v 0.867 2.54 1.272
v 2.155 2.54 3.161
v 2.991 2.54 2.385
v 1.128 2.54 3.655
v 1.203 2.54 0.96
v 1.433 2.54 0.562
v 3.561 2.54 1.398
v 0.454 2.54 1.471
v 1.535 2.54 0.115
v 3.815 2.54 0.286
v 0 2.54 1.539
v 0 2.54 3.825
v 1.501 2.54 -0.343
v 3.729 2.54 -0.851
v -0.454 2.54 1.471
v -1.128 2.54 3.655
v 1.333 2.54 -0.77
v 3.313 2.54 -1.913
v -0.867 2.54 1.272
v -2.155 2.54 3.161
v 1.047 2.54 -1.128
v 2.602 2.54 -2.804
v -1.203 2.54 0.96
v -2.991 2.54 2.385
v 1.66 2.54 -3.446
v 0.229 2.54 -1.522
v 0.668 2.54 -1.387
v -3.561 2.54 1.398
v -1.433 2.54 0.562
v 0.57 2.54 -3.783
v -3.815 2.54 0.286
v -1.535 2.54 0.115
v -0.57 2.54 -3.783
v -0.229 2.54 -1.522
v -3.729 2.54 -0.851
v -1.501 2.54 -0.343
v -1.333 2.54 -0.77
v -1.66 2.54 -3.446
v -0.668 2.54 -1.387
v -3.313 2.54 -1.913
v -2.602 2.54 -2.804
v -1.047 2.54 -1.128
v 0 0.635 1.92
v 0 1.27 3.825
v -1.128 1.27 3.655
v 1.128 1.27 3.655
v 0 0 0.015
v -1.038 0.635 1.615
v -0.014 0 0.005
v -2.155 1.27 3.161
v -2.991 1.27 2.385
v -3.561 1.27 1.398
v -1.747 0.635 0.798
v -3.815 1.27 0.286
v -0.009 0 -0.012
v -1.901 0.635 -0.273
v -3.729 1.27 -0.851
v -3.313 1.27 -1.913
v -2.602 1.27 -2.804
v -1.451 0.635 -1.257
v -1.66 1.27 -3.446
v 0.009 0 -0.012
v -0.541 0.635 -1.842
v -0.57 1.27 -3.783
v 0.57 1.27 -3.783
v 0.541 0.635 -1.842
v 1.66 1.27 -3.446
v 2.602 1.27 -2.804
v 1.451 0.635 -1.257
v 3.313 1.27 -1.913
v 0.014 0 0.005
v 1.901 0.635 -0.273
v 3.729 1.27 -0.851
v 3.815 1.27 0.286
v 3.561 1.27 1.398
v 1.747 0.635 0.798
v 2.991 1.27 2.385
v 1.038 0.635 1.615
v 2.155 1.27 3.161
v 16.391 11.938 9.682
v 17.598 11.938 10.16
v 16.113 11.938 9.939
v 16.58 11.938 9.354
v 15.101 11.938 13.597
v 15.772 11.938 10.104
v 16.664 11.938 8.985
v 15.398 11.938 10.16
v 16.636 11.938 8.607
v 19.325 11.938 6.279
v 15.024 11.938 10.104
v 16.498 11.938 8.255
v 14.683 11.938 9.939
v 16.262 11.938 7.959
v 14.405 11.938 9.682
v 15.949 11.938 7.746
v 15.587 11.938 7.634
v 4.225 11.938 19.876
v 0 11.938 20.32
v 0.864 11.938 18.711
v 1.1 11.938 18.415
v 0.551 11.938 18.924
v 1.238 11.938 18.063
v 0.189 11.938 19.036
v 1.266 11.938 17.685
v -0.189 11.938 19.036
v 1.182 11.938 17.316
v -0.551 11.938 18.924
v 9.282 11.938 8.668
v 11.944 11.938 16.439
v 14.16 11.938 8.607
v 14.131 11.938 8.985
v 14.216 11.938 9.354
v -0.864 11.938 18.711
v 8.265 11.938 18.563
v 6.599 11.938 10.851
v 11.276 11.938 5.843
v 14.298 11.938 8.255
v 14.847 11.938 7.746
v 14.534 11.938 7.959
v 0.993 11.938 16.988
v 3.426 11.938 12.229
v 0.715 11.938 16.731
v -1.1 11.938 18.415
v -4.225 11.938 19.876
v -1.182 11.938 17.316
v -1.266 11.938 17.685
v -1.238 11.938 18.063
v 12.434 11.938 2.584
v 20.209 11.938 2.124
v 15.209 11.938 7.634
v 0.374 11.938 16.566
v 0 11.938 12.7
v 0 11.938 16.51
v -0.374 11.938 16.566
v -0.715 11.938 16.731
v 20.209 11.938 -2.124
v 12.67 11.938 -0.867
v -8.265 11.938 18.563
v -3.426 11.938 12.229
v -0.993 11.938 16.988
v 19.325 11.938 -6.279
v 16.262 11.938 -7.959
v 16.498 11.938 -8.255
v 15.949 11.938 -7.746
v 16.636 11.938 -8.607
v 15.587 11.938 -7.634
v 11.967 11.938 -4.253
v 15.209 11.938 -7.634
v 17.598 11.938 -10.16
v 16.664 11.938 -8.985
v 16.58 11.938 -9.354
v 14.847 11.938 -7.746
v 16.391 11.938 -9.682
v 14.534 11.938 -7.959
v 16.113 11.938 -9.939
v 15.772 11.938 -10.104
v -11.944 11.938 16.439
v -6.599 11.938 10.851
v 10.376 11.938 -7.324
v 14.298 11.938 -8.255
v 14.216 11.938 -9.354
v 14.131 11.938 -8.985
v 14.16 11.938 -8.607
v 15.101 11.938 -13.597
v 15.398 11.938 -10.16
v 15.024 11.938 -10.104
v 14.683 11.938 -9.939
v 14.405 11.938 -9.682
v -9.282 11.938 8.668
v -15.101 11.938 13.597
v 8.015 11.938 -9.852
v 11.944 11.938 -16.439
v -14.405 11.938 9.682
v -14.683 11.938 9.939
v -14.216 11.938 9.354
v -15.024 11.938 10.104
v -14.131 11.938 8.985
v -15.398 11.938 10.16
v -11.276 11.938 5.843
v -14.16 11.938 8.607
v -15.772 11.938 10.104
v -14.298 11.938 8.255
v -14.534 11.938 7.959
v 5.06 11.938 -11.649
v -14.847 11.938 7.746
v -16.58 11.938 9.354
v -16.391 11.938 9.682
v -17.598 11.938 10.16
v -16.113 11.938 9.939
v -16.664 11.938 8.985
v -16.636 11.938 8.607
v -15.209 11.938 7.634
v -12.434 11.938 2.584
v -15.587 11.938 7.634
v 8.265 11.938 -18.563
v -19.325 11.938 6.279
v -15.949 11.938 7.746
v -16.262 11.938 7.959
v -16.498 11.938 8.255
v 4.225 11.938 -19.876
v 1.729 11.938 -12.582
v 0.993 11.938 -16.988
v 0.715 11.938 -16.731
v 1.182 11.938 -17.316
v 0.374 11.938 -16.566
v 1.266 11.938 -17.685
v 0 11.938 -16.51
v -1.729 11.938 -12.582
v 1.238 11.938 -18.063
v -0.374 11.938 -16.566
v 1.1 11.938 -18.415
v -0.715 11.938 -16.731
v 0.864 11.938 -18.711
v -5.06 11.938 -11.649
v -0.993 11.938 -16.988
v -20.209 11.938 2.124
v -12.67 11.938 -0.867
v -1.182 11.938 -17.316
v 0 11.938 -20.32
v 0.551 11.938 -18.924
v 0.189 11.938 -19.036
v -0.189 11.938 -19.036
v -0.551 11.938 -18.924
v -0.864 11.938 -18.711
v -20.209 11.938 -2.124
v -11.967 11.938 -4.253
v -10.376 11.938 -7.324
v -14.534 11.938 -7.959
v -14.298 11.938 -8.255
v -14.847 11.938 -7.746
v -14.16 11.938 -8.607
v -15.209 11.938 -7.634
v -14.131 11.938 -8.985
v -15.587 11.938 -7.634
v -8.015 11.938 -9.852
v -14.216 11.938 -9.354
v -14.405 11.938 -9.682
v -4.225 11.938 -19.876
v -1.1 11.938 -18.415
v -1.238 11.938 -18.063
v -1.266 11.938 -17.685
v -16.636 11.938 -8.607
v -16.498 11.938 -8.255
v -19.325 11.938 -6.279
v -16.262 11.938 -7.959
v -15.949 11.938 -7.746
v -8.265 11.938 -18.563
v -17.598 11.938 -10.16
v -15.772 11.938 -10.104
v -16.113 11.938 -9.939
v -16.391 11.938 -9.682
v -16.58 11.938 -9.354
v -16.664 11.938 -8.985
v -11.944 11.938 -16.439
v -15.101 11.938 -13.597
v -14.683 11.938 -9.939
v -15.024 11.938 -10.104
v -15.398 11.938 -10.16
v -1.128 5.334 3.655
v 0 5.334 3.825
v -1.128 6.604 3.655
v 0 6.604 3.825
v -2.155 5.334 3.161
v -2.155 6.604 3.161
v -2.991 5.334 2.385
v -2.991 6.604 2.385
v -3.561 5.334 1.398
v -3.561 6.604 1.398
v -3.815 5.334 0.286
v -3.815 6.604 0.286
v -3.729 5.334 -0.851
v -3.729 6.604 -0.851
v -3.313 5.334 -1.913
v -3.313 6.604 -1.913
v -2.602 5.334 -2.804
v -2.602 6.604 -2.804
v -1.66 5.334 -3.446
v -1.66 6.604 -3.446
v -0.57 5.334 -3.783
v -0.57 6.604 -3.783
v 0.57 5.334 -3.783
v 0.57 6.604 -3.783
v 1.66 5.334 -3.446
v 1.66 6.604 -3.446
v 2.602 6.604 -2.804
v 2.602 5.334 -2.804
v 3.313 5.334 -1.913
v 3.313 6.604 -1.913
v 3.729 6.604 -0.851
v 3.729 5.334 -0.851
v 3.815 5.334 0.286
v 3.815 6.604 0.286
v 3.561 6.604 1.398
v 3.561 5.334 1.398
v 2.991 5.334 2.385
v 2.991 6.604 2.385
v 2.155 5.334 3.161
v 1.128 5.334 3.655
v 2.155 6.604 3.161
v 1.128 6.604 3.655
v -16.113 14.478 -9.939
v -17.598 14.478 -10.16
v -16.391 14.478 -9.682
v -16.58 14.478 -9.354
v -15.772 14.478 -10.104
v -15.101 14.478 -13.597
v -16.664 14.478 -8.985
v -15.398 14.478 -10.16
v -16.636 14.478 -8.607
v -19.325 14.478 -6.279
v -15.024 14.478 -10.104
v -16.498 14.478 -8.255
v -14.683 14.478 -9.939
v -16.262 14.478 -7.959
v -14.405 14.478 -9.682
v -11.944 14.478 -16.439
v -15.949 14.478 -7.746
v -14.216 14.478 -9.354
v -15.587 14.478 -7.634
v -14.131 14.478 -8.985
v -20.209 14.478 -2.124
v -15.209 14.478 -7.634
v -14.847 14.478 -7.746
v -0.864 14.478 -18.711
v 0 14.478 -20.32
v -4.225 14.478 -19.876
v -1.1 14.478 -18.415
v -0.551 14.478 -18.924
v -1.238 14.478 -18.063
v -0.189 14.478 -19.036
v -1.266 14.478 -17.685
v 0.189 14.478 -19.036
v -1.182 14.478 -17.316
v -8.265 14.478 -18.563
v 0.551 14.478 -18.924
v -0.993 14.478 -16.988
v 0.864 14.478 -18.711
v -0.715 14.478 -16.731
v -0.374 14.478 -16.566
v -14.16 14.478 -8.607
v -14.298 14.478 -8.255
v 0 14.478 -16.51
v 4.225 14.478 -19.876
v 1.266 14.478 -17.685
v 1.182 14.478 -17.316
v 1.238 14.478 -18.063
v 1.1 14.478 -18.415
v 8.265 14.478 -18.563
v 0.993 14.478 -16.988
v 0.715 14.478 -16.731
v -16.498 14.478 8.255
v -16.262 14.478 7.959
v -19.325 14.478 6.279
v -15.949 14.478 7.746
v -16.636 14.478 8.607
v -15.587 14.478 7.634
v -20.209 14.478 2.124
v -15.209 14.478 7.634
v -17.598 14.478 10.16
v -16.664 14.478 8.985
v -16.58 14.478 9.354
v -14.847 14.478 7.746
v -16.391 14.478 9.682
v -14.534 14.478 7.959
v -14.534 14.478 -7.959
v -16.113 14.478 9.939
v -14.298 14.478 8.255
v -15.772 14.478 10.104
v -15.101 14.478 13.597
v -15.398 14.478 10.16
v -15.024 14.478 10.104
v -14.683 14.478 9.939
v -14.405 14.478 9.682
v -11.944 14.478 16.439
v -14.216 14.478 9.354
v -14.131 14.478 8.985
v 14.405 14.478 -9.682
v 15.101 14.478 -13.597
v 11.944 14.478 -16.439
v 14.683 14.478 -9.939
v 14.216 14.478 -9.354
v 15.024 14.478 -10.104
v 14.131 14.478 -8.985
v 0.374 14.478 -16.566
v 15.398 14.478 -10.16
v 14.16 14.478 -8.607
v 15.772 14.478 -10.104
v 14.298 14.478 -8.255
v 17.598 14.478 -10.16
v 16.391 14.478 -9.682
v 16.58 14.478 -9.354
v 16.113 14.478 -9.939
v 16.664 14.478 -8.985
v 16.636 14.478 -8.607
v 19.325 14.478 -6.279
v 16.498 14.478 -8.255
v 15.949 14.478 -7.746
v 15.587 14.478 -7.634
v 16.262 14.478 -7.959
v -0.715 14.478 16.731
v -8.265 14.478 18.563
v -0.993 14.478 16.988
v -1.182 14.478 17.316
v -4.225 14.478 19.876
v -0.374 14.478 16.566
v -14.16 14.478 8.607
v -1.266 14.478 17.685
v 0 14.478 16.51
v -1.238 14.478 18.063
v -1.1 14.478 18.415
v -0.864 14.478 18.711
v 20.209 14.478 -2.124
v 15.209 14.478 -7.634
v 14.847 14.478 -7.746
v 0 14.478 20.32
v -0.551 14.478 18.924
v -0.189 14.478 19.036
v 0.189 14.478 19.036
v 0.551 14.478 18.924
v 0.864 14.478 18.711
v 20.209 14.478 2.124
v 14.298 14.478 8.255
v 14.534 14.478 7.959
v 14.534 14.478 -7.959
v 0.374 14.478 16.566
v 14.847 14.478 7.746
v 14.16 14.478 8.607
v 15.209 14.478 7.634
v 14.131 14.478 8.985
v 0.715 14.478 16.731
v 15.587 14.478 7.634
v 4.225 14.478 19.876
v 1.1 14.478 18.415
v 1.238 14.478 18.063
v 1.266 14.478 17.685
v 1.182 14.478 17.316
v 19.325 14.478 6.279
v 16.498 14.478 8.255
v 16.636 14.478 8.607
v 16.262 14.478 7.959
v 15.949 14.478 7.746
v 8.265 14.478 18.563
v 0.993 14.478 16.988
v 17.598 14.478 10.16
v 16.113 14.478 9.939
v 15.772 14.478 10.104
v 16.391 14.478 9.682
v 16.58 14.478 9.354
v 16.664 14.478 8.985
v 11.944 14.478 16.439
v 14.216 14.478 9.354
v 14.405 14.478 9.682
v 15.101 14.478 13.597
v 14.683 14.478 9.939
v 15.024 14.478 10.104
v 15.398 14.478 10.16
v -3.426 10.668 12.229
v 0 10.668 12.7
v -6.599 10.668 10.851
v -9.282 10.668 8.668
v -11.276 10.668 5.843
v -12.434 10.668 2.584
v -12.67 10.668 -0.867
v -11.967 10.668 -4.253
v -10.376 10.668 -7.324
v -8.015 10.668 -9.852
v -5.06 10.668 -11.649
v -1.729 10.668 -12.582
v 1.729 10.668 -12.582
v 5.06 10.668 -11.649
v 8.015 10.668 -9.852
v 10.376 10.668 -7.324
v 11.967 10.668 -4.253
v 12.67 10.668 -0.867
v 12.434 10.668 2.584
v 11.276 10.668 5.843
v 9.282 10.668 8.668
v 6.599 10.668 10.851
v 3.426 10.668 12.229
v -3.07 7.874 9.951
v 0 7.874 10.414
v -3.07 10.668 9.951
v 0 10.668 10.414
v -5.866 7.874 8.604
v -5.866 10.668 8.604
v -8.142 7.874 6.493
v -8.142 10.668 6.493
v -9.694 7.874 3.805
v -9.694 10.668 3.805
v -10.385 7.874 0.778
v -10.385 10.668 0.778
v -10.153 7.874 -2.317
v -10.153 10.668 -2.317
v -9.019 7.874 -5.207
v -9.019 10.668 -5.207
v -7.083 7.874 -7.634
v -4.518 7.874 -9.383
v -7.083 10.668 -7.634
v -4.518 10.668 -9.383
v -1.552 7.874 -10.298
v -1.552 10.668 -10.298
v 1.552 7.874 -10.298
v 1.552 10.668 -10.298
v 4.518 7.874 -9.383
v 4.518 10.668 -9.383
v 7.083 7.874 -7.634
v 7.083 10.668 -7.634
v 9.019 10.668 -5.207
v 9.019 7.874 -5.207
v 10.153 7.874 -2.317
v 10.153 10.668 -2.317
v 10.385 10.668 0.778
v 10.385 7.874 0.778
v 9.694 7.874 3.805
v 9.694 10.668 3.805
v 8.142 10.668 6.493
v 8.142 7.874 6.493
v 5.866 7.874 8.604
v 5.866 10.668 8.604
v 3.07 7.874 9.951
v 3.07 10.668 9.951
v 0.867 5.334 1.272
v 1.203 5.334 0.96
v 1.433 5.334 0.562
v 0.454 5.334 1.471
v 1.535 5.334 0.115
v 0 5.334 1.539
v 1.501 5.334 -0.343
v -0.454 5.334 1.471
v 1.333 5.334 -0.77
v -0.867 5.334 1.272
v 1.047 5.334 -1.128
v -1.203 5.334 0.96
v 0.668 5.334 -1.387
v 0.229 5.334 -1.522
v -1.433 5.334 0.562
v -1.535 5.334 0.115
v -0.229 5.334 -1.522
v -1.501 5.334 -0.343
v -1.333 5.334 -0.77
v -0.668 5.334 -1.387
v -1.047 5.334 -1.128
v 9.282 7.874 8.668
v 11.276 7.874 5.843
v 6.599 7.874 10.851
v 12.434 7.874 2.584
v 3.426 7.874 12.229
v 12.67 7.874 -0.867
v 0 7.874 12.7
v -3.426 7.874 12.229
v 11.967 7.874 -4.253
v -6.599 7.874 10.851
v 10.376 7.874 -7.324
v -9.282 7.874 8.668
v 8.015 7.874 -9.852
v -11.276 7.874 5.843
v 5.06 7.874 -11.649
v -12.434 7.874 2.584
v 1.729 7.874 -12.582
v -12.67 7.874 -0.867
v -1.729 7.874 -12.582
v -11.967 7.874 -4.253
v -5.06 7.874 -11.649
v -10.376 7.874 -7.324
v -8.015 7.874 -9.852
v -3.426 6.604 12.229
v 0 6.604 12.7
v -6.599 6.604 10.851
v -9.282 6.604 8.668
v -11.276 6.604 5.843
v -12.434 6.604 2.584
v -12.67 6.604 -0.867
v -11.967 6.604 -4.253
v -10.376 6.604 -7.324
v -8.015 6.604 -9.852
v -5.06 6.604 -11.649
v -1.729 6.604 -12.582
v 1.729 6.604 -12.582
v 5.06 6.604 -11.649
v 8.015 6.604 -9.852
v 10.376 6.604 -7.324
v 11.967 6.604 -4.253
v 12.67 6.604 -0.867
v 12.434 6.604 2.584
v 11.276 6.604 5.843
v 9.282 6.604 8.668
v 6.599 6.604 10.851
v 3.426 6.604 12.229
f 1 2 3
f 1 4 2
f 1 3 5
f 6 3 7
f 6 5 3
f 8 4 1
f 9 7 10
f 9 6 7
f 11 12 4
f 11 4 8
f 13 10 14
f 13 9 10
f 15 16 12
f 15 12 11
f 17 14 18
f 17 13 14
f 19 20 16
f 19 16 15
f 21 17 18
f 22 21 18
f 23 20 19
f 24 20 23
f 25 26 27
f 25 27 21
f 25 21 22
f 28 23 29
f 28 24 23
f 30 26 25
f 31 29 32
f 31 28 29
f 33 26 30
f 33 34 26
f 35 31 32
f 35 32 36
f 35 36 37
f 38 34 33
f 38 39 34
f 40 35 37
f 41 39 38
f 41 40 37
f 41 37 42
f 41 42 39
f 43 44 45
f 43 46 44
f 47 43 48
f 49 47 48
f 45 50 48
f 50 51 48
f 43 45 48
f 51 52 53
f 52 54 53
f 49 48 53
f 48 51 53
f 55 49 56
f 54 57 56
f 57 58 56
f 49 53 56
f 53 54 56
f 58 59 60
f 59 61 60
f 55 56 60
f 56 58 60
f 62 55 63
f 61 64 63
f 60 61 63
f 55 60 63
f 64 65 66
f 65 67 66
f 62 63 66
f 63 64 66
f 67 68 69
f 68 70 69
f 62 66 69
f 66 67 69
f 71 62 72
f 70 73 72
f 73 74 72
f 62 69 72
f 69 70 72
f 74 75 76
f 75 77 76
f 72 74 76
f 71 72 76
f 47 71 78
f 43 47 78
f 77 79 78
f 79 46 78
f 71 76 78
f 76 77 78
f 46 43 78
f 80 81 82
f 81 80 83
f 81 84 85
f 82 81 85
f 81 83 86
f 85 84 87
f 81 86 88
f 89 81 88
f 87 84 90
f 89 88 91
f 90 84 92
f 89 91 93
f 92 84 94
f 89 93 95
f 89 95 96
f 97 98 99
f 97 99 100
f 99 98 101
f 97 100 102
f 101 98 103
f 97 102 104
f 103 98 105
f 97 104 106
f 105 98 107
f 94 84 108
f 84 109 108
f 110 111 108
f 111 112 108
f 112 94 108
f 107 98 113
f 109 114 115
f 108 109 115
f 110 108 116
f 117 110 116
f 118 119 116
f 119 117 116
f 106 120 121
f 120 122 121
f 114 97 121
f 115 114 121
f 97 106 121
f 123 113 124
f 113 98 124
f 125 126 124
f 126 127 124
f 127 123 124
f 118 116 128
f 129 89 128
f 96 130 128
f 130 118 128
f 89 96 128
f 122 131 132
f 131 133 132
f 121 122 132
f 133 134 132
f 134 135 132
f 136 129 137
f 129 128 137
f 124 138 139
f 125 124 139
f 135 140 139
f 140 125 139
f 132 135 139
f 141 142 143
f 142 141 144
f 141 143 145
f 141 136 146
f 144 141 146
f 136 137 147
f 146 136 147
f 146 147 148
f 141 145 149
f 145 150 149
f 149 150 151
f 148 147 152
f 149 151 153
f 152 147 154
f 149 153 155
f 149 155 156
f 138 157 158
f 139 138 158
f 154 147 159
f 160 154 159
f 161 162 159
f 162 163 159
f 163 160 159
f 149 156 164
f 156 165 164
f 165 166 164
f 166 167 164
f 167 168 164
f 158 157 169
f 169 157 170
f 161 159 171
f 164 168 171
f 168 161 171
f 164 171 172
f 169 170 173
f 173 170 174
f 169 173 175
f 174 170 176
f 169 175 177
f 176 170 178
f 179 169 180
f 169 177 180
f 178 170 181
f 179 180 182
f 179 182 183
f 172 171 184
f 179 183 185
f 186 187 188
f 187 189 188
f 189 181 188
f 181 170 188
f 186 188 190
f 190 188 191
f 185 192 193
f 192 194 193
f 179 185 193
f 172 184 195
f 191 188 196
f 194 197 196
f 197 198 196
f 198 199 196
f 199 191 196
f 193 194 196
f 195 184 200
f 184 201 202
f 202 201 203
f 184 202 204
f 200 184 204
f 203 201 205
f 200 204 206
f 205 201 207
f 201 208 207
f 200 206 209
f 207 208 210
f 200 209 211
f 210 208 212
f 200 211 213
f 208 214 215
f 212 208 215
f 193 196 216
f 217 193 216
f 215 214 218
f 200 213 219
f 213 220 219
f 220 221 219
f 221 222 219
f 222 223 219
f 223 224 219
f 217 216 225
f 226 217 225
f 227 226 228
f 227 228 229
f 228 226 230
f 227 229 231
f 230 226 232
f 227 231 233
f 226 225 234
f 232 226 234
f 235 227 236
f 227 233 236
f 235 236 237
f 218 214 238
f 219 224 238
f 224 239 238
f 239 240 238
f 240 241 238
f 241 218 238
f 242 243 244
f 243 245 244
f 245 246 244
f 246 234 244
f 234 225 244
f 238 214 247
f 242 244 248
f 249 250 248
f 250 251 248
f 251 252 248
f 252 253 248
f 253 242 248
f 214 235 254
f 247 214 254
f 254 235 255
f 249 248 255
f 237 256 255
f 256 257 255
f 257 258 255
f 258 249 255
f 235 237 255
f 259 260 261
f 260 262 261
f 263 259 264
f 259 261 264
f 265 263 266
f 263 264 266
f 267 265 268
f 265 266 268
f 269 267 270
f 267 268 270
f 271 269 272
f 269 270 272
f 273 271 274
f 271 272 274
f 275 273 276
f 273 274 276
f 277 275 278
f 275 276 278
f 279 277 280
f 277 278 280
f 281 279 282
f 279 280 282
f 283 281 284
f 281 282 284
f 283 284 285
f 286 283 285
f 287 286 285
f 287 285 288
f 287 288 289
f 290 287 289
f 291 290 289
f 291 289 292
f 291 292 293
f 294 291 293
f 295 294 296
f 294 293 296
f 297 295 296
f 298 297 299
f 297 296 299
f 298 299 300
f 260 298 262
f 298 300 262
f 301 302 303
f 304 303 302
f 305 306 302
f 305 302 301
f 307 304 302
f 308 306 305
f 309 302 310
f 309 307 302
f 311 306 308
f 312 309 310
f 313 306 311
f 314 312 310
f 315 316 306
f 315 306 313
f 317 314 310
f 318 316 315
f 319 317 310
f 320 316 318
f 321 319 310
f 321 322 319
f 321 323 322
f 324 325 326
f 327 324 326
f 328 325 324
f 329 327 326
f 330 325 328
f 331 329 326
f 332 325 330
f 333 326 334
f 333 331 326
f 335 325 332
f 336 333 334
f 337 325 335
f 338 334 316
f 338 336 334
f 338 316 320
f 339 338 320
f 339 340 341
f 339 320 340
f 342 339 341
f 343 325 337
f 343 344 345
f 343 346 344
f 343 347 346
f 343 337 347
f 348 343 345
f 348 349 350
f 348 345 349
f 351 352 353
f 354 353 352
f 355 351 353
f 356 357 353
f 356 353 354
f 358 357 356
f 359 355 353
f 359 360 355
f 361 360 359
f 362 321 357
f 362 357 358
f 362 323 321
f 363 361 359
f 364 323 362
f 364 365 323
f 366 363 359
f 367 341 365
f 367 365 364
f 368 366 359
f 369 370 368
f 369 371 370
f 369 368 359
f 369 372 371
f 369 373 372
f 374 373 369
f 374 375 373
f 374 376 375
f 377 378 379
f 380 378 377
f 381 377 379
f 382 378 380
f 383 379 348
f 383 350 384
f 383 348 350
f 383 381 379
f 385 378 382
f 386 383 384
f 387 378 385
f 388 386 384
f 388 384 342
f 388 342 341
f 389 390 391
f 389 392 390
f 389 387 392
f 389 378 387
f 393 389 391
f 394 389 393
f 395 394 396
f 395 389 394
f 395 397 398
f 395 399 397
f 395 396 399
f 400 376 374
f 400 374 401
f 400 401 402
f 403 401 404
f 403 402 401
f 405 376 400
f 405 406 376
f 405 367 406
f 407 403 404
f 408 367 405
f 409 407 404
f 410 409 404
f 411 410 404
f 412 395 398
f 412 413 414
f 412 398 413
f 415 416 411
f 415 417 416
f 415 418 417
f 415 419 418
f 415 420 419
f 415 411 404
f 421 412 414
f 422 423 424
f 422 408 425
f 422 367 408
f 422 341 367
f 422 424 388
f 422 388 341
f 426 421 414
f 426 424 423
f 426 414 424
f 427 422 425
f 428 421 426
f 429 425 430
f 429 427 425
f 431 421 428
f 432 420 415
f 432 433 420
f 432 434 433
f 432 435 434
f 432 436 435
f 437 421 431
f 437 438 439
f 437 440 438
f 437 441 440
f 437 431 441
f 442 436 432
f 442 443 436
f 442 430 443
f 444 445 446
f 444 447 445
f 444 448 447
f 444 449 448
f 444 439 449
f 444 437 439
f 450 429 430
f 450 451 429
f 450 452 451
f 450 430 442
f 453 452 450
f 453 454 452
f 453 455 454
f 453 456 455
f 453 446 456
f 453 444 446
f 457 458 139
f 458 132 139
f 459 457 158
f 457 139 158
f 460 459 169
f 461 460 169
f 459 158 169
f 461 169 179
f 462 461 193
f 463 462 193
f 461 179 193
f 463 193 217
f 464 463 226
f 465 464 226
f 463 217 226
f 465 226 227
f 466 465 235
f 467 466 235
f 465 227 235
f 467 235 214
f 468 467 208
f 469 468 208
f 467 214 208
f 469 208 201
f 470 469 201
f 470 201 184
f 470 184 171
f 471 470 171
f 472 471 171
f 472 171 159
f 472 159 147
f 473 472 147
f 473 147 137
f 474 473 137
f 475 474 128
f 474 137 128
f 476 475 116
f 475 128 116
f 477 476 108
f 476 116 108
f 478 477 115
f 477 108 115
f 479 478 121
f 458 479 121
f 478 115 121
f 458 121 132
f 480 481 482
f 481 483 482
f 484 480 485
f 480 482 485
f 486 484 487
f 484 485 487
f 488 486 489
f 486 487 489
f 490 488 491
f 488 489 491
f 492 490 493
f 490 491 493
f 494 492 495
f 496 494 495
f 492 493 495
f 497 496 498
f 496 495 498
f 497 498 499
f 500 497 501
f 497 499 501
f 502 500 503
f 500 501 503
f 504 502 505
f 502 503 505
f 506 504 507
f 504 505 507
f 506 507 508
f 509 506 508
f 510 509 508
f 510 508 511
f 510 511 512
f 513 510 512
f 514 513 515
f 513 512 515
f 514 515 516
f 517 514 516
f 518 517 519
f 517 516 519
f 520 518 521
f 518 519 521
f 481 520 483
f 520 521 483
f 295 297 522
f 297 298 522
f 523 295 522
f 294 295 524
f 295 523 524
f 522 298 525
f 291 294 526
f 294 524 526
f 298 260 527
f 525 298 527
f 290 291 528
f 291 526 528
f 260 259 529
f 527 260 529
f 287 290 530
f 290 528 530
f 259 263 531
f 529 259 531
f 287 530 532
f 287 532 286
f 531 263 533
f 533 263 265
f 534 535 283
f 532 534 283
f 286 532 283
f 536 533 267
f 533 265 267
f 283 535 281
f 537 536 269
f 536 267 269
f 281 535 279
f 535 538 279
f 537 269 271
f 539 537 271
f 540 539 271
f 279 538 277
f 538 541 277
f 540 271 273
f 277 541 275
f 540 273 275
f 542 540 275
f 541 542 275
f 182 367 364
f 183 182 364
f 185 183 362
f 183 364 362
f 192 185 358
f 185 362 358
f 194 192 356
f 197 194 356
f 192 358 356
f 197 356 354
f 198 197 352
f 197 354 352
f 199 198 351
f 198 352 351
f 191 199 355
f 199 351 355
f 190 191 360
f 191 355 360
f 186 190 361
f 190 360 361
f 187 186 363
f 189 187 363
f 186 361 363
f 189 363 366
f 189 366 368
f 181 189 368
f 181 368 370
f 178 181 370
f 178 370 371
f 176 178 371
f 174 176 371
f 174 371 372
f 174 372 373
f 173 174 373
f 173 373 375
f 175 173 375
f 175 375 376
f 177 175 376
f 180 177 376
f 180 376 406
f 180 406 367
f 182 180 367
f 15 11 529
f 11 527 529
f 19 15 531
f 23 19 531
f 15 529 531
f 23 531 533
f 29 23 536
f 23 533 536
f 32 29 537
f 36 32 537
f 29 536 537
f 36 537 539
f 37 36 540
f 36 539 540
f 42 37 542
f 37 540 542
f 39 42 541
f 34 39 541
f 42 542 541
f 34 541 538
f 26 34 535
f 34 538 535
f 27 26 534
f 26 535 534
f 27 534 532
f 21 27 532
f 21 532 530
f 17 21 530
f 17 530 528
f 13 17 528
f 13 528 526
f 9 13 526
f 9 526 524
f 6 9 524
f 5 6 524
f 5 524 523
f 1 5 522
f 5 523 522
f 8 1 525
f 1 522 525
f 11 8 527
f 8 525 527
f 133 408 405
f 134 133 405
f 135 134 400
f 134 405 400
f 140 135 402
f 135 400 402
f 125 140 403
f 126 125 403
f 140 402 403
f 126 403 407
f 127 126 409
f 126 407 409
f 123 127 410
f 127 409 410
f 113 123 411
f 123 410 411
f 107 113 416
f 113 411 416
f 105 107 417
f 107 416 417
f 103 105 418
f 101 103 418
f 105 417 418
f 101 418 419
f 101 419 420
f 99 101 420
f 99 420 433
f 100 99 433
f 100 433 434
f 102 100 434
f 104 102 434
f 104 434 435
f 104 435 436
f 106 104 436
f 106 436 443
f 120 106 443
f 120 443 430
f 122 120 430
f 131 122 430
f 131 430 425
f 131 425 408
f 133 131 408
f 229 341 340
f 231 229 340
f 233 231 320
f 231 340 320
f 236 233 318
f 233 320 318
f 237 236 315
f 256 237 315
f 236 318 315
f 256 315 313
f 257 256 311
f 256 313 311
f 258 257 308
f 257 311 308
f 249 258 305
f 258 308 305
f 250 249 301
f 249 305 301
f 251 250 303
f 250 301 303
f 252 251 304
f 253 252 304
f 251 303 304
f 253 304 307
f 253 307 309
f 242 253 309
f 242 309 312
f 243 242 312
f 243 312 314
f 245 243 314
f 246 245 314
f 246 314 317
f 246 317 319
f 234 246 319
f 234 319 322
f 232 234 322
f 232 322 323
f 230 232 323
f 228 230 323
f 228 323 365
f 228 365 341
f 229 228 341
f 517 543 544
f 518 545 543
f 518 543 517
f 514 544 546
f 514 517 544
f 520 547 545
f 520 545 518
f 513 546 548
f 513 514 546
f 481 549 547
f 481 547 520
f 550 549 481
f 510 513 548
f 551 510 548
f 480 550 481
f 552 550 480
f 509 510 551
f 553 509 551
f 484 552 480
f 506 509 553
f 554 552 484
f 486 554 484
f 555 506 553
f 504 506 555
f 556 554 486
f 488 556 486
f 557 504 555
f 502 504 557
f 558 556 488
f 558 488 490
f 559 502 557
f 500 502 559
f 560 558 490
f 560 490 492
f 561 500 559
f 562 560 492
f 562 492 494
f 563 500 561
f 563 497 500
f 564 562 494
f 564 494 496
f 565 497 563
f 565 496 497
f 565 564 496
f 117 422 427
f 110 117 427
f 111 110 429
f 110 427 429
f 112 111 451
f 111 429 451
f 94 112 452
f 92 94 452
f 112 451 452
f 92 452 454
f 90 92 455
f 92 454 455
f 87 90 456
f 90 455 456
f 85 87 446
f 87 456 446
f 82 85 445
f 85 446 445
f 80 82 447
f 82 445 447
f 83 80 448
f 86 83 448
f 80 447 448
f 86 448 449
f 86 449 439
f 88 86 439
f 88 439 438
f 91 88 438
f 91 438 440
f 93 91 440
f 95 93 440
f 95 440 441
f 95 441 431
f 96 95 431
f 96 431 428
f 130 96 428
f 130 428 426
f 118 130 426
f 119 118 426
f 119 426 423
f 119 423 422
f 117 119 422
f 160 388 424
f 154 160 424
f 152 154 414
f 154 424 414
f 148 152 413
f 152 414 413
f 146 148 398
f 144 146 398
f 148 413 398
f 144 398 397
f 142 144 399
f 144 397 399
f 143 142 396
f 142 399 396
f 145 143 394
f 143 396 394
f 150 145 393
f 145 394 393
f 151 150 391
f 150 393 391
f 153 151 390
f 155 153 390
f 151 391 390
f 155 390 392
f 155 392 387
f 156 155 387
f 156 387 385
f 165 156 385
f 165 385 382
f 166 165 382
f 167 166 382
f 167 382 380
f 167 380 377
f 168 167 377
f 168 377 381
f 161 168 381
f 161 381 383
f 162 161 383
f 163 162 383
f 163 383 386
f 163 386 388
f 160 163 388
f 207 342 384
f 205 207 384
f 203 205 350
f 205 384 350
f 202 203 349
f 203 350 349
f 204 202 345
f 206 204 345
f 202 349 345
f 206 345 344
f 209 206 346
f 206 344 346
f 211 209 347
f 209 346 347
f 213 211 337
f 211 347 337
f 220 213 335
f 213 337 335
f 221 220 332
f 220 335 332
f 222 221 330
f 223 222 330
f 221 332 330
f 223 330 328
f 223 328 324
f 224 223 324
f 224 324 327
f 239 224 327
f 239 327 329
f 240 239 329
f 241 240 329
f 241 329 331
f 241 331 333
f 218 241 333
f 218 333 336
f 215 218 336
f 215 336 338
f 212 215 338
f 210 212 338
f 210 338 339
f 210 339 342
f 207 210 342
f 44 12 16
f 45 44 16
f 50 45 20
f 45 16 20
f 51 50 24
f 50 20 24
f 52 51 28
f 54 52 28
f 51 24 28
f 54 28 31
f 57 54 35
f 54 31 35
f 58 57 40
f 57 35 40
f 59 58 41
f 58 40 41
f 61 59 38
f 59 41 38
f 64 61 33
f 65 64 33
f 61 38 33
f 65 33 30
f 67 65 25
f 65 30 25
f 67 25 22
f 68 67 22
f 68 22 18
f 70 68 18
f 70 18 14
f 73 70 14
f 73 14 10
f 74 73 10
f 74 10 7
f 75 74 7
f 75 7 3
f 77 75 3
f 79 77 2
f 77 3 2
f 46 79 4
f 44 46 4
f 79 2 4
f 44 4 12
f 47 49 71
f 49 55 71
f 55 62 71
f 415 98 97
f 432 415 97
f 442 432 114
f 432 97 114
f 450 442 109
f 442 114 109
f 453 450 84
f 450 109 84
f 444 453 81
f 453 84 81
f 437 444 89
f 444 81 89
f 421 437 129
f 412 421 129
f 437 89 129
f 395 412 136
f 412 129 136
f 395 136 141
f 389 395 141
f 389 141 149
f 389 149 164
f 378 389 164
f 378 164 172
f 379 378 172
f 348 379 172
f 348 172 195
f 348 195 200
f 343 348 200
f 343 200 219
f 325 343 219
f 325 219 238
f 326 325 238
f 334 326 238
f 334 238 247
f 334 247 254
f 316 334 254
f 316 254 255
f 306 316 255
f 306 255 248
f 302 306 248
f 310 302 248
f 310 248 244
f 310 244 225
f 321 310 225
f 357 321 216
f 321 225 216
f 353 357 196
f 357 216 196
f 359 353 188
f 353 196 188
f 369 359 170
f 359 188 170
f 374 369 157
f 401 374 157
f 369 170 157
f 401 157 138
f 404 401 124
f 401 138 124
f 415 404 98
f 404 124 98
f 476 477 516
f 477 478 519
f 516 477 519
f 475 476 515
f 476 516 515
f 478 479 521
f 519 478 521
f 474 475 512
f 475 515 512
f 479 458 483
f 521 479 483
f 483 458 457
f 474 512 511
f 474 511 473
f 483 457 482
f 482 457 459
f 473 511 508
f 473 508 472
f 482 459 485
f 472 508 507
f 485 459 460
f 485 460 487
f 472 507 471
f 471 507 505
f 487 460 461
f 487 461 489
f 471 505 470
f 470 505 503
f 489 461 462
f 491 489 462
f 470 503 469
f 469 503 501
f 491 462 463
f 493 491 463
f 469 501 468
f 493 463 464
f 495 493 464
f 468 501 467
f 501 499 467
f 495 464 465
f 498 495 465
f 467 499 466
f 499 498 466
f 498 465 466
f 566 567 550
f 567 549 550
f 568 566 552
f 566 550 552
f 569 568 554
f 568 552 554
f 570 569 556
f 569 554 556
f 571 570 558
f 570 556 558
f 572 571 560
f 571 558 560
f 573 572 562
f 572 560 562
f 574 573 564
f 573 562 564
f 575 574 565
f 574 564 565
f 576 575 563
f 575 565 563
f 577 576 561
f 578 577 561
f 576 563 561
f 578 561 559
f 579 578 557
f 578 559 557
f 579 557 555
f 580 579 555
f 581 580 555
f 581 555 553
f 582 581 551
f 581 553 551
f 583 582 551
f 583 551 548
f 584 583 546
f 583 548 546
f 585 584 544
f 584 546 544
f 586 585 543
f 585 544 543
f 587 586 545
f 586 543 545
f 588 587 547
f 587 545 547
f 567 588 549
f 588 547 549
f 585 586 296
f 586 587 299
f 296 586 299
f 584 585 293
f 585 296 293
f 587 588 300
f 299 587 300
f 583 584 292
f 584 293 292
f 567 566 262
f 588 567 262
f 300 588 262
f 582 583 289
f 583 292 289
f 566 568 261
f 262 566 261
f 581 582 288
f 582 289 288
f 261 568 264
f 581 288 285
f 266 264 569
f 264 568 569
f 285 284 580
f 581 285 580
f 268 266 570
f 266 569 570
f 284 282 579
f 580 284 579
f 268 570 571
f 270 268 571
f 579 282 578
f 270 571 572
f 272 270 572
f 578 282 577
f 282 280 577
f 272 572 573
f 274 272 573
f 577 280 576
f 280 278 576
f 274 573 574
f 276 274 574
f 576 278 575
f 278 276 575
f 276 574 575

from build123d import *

# Parameters (mm, degrees)
SKETCH1_R                   = 20.32
CYLINDER_DEPTH              = 14.478
SKETCH2_W                   = 7.62
SKETCH2_H                   = 11.938
SKETCH3_W                   = 2.286
SKETCH3_H                   = 2.794
SKETCH4_W                   = 8.87476
SKETCH4_H                   = 6.604
SKETCH5_W                   = 2.286
SKETCH5_H                   = 2.794
BOTTOM_CHAMFER_SIZE         = 3.81
BOTTOM_CHAMFER_SIZE2        = 1.27
MOUNTING_HOLE_REACH         = 34.178
SKETCH6_R                   = 1.27
MOUNTING_HOLE_PATTERN_COUNT = 6


with BuildPart() as part:
    # Sketch1 → Cylinder (new body)
    with BuildSketch(Plane(origin=(0, 0, 0), x_dir=(1, 0, 0), z_dir=(0, 1, 0))):
        with Locations(Location((0, 0, 0), (0, 0, 270))):
            Circle(SKETCH1_R)
    extrude(amount=CYLINDER_DEPTH)

    # Sketch2 → Mid O Ring Wings (revolve, cut)
    with BuildSketch(Plane.XY, mode=Mode.PRIVATE) as mid_o_ring_wings_sk:
        with Locations((16.51, 5.969)):
            Rectangle(SKETCH2_W, SKETCH2_H)
    revolve(mid_o_ring_wings_sk.sketch.rotate(Axis((0, 21.496286204, 0), (0, -1, 0)), 90), axis=Axis((0, 21.496286204, 0), (0, -1, 0)), mode=Mode.SUBTRACT)

    # Sketch3 → Mid O Ring Cut (revolve, cut)
    with BuildSketch(Plane.XY, mode=Mode.PRIVATE) as mid_o_ring_cut_sk:
        with Locations((11.557, 9.271)):
            Rectangle(SKETCH3_W, SKETCH3_H)
    revolve(mid_o_ring_cut_sk.sketch.rotate(Axis((0, 21.496286204, 0), (0, -1, 0)), 90), axis=Axis((0, 21.496286204, 0), (0, -1, 0)), mode=Mode.SUBTRACT)

    # Sketch4 → Bottom O Ring Wings (revolve, cut)
    with BuildSketch(Plane.XY, mode=Mode.PRIVATE) as bottom_o_ring_wings_sk:
        with Locations((8.26262, 3.302)):
            Rectangle(SKETCH4_W, SKETCH4_H)
    revolve(bottom_o_ring_wings_sk.sketch.rotate(Axis((0, 21.496286204, 0), (0, -1, 0)), 90), axis=Axis((0, 21.496286204, 0), (0, -1, 0)), mode=Mode.SUBTRACT)

    # Sketch5 → Bottom O Ring Cut (revolve, cut)
    with BuildSketch(Plane.XY, mode=Mode.PRIVATE) as bottom_o_ring_cut_sk:
        with Locations((2.68224, 3.937)):
            Rectangle(SKETCH5_W, SKETCH5_H)
    revolve(bottom_o_ring_cut_sk.sketch.rotate(Axis((0, 21.496286204, 0), (0, -1, 0)), 90), axis=Axis((0, 21.496286204, 0), (0, -1, 0)), mode=Mode.SUBTRACT)

    # Bottom Chamfer
    bottom_chamfer_edges = [part.edges().sort_by_distance(p)[0] for p in [
        (0, 0, -3.82524),
    ]]
    bottom_chamfer_side = [part.faces().sort_by_distance(p)[0] for p in [
        (0, 0, 0),
    ]]
    chamfer(bottom_chamfer_edges, length=BOTTOM_CHAMFER_SIZE, length2=BOTTOM_CHAMFER_SIZE2, reference=bottom_chamfer_side[0])

    # Sketch6 → Mounting Hole (cut, up to next)
    with BuildSketch(Plane(origin=(0, 14.478, 0), x_dir=(1, 0, 0), z_dir=(0, 1, 0)), mode=Mode.PRIVATE) as mounting_hole_sk1:
        with Locations(Location((0, 17.78, 0), (0, 0, 270))):
            Circle(SKETCH6_R)
    mounting_hole_tool1 = extrude(mounting_hole_sk1.sketch, amount=-MOUNTING_HOLE_REACH, mode=Mode.PRIVATE) & part.part
    mounting_hole = mounting_hole_tool1.solids().sort_by_distance((0, 14.478, -17.78))[0]
    add(mounting_hole, mode=Mode.SUBTRACT)

    # Mounting Hole Pattern: Mounting Hole ×6 about axis
    mounting_hole_pattern_axis = Axis((0, 0, 0), (0, 1, 0))
    for i in range(1, MOUNTING_HOLE_PATTERN_COUNT):
        add(mounting_hole.rotate(mounting_hole_pattern_axis, i * 360 / MOUNTING_HOLE_PATTERN_COUNT), mode=Mode.SUBTRACT)


solid = part.part
